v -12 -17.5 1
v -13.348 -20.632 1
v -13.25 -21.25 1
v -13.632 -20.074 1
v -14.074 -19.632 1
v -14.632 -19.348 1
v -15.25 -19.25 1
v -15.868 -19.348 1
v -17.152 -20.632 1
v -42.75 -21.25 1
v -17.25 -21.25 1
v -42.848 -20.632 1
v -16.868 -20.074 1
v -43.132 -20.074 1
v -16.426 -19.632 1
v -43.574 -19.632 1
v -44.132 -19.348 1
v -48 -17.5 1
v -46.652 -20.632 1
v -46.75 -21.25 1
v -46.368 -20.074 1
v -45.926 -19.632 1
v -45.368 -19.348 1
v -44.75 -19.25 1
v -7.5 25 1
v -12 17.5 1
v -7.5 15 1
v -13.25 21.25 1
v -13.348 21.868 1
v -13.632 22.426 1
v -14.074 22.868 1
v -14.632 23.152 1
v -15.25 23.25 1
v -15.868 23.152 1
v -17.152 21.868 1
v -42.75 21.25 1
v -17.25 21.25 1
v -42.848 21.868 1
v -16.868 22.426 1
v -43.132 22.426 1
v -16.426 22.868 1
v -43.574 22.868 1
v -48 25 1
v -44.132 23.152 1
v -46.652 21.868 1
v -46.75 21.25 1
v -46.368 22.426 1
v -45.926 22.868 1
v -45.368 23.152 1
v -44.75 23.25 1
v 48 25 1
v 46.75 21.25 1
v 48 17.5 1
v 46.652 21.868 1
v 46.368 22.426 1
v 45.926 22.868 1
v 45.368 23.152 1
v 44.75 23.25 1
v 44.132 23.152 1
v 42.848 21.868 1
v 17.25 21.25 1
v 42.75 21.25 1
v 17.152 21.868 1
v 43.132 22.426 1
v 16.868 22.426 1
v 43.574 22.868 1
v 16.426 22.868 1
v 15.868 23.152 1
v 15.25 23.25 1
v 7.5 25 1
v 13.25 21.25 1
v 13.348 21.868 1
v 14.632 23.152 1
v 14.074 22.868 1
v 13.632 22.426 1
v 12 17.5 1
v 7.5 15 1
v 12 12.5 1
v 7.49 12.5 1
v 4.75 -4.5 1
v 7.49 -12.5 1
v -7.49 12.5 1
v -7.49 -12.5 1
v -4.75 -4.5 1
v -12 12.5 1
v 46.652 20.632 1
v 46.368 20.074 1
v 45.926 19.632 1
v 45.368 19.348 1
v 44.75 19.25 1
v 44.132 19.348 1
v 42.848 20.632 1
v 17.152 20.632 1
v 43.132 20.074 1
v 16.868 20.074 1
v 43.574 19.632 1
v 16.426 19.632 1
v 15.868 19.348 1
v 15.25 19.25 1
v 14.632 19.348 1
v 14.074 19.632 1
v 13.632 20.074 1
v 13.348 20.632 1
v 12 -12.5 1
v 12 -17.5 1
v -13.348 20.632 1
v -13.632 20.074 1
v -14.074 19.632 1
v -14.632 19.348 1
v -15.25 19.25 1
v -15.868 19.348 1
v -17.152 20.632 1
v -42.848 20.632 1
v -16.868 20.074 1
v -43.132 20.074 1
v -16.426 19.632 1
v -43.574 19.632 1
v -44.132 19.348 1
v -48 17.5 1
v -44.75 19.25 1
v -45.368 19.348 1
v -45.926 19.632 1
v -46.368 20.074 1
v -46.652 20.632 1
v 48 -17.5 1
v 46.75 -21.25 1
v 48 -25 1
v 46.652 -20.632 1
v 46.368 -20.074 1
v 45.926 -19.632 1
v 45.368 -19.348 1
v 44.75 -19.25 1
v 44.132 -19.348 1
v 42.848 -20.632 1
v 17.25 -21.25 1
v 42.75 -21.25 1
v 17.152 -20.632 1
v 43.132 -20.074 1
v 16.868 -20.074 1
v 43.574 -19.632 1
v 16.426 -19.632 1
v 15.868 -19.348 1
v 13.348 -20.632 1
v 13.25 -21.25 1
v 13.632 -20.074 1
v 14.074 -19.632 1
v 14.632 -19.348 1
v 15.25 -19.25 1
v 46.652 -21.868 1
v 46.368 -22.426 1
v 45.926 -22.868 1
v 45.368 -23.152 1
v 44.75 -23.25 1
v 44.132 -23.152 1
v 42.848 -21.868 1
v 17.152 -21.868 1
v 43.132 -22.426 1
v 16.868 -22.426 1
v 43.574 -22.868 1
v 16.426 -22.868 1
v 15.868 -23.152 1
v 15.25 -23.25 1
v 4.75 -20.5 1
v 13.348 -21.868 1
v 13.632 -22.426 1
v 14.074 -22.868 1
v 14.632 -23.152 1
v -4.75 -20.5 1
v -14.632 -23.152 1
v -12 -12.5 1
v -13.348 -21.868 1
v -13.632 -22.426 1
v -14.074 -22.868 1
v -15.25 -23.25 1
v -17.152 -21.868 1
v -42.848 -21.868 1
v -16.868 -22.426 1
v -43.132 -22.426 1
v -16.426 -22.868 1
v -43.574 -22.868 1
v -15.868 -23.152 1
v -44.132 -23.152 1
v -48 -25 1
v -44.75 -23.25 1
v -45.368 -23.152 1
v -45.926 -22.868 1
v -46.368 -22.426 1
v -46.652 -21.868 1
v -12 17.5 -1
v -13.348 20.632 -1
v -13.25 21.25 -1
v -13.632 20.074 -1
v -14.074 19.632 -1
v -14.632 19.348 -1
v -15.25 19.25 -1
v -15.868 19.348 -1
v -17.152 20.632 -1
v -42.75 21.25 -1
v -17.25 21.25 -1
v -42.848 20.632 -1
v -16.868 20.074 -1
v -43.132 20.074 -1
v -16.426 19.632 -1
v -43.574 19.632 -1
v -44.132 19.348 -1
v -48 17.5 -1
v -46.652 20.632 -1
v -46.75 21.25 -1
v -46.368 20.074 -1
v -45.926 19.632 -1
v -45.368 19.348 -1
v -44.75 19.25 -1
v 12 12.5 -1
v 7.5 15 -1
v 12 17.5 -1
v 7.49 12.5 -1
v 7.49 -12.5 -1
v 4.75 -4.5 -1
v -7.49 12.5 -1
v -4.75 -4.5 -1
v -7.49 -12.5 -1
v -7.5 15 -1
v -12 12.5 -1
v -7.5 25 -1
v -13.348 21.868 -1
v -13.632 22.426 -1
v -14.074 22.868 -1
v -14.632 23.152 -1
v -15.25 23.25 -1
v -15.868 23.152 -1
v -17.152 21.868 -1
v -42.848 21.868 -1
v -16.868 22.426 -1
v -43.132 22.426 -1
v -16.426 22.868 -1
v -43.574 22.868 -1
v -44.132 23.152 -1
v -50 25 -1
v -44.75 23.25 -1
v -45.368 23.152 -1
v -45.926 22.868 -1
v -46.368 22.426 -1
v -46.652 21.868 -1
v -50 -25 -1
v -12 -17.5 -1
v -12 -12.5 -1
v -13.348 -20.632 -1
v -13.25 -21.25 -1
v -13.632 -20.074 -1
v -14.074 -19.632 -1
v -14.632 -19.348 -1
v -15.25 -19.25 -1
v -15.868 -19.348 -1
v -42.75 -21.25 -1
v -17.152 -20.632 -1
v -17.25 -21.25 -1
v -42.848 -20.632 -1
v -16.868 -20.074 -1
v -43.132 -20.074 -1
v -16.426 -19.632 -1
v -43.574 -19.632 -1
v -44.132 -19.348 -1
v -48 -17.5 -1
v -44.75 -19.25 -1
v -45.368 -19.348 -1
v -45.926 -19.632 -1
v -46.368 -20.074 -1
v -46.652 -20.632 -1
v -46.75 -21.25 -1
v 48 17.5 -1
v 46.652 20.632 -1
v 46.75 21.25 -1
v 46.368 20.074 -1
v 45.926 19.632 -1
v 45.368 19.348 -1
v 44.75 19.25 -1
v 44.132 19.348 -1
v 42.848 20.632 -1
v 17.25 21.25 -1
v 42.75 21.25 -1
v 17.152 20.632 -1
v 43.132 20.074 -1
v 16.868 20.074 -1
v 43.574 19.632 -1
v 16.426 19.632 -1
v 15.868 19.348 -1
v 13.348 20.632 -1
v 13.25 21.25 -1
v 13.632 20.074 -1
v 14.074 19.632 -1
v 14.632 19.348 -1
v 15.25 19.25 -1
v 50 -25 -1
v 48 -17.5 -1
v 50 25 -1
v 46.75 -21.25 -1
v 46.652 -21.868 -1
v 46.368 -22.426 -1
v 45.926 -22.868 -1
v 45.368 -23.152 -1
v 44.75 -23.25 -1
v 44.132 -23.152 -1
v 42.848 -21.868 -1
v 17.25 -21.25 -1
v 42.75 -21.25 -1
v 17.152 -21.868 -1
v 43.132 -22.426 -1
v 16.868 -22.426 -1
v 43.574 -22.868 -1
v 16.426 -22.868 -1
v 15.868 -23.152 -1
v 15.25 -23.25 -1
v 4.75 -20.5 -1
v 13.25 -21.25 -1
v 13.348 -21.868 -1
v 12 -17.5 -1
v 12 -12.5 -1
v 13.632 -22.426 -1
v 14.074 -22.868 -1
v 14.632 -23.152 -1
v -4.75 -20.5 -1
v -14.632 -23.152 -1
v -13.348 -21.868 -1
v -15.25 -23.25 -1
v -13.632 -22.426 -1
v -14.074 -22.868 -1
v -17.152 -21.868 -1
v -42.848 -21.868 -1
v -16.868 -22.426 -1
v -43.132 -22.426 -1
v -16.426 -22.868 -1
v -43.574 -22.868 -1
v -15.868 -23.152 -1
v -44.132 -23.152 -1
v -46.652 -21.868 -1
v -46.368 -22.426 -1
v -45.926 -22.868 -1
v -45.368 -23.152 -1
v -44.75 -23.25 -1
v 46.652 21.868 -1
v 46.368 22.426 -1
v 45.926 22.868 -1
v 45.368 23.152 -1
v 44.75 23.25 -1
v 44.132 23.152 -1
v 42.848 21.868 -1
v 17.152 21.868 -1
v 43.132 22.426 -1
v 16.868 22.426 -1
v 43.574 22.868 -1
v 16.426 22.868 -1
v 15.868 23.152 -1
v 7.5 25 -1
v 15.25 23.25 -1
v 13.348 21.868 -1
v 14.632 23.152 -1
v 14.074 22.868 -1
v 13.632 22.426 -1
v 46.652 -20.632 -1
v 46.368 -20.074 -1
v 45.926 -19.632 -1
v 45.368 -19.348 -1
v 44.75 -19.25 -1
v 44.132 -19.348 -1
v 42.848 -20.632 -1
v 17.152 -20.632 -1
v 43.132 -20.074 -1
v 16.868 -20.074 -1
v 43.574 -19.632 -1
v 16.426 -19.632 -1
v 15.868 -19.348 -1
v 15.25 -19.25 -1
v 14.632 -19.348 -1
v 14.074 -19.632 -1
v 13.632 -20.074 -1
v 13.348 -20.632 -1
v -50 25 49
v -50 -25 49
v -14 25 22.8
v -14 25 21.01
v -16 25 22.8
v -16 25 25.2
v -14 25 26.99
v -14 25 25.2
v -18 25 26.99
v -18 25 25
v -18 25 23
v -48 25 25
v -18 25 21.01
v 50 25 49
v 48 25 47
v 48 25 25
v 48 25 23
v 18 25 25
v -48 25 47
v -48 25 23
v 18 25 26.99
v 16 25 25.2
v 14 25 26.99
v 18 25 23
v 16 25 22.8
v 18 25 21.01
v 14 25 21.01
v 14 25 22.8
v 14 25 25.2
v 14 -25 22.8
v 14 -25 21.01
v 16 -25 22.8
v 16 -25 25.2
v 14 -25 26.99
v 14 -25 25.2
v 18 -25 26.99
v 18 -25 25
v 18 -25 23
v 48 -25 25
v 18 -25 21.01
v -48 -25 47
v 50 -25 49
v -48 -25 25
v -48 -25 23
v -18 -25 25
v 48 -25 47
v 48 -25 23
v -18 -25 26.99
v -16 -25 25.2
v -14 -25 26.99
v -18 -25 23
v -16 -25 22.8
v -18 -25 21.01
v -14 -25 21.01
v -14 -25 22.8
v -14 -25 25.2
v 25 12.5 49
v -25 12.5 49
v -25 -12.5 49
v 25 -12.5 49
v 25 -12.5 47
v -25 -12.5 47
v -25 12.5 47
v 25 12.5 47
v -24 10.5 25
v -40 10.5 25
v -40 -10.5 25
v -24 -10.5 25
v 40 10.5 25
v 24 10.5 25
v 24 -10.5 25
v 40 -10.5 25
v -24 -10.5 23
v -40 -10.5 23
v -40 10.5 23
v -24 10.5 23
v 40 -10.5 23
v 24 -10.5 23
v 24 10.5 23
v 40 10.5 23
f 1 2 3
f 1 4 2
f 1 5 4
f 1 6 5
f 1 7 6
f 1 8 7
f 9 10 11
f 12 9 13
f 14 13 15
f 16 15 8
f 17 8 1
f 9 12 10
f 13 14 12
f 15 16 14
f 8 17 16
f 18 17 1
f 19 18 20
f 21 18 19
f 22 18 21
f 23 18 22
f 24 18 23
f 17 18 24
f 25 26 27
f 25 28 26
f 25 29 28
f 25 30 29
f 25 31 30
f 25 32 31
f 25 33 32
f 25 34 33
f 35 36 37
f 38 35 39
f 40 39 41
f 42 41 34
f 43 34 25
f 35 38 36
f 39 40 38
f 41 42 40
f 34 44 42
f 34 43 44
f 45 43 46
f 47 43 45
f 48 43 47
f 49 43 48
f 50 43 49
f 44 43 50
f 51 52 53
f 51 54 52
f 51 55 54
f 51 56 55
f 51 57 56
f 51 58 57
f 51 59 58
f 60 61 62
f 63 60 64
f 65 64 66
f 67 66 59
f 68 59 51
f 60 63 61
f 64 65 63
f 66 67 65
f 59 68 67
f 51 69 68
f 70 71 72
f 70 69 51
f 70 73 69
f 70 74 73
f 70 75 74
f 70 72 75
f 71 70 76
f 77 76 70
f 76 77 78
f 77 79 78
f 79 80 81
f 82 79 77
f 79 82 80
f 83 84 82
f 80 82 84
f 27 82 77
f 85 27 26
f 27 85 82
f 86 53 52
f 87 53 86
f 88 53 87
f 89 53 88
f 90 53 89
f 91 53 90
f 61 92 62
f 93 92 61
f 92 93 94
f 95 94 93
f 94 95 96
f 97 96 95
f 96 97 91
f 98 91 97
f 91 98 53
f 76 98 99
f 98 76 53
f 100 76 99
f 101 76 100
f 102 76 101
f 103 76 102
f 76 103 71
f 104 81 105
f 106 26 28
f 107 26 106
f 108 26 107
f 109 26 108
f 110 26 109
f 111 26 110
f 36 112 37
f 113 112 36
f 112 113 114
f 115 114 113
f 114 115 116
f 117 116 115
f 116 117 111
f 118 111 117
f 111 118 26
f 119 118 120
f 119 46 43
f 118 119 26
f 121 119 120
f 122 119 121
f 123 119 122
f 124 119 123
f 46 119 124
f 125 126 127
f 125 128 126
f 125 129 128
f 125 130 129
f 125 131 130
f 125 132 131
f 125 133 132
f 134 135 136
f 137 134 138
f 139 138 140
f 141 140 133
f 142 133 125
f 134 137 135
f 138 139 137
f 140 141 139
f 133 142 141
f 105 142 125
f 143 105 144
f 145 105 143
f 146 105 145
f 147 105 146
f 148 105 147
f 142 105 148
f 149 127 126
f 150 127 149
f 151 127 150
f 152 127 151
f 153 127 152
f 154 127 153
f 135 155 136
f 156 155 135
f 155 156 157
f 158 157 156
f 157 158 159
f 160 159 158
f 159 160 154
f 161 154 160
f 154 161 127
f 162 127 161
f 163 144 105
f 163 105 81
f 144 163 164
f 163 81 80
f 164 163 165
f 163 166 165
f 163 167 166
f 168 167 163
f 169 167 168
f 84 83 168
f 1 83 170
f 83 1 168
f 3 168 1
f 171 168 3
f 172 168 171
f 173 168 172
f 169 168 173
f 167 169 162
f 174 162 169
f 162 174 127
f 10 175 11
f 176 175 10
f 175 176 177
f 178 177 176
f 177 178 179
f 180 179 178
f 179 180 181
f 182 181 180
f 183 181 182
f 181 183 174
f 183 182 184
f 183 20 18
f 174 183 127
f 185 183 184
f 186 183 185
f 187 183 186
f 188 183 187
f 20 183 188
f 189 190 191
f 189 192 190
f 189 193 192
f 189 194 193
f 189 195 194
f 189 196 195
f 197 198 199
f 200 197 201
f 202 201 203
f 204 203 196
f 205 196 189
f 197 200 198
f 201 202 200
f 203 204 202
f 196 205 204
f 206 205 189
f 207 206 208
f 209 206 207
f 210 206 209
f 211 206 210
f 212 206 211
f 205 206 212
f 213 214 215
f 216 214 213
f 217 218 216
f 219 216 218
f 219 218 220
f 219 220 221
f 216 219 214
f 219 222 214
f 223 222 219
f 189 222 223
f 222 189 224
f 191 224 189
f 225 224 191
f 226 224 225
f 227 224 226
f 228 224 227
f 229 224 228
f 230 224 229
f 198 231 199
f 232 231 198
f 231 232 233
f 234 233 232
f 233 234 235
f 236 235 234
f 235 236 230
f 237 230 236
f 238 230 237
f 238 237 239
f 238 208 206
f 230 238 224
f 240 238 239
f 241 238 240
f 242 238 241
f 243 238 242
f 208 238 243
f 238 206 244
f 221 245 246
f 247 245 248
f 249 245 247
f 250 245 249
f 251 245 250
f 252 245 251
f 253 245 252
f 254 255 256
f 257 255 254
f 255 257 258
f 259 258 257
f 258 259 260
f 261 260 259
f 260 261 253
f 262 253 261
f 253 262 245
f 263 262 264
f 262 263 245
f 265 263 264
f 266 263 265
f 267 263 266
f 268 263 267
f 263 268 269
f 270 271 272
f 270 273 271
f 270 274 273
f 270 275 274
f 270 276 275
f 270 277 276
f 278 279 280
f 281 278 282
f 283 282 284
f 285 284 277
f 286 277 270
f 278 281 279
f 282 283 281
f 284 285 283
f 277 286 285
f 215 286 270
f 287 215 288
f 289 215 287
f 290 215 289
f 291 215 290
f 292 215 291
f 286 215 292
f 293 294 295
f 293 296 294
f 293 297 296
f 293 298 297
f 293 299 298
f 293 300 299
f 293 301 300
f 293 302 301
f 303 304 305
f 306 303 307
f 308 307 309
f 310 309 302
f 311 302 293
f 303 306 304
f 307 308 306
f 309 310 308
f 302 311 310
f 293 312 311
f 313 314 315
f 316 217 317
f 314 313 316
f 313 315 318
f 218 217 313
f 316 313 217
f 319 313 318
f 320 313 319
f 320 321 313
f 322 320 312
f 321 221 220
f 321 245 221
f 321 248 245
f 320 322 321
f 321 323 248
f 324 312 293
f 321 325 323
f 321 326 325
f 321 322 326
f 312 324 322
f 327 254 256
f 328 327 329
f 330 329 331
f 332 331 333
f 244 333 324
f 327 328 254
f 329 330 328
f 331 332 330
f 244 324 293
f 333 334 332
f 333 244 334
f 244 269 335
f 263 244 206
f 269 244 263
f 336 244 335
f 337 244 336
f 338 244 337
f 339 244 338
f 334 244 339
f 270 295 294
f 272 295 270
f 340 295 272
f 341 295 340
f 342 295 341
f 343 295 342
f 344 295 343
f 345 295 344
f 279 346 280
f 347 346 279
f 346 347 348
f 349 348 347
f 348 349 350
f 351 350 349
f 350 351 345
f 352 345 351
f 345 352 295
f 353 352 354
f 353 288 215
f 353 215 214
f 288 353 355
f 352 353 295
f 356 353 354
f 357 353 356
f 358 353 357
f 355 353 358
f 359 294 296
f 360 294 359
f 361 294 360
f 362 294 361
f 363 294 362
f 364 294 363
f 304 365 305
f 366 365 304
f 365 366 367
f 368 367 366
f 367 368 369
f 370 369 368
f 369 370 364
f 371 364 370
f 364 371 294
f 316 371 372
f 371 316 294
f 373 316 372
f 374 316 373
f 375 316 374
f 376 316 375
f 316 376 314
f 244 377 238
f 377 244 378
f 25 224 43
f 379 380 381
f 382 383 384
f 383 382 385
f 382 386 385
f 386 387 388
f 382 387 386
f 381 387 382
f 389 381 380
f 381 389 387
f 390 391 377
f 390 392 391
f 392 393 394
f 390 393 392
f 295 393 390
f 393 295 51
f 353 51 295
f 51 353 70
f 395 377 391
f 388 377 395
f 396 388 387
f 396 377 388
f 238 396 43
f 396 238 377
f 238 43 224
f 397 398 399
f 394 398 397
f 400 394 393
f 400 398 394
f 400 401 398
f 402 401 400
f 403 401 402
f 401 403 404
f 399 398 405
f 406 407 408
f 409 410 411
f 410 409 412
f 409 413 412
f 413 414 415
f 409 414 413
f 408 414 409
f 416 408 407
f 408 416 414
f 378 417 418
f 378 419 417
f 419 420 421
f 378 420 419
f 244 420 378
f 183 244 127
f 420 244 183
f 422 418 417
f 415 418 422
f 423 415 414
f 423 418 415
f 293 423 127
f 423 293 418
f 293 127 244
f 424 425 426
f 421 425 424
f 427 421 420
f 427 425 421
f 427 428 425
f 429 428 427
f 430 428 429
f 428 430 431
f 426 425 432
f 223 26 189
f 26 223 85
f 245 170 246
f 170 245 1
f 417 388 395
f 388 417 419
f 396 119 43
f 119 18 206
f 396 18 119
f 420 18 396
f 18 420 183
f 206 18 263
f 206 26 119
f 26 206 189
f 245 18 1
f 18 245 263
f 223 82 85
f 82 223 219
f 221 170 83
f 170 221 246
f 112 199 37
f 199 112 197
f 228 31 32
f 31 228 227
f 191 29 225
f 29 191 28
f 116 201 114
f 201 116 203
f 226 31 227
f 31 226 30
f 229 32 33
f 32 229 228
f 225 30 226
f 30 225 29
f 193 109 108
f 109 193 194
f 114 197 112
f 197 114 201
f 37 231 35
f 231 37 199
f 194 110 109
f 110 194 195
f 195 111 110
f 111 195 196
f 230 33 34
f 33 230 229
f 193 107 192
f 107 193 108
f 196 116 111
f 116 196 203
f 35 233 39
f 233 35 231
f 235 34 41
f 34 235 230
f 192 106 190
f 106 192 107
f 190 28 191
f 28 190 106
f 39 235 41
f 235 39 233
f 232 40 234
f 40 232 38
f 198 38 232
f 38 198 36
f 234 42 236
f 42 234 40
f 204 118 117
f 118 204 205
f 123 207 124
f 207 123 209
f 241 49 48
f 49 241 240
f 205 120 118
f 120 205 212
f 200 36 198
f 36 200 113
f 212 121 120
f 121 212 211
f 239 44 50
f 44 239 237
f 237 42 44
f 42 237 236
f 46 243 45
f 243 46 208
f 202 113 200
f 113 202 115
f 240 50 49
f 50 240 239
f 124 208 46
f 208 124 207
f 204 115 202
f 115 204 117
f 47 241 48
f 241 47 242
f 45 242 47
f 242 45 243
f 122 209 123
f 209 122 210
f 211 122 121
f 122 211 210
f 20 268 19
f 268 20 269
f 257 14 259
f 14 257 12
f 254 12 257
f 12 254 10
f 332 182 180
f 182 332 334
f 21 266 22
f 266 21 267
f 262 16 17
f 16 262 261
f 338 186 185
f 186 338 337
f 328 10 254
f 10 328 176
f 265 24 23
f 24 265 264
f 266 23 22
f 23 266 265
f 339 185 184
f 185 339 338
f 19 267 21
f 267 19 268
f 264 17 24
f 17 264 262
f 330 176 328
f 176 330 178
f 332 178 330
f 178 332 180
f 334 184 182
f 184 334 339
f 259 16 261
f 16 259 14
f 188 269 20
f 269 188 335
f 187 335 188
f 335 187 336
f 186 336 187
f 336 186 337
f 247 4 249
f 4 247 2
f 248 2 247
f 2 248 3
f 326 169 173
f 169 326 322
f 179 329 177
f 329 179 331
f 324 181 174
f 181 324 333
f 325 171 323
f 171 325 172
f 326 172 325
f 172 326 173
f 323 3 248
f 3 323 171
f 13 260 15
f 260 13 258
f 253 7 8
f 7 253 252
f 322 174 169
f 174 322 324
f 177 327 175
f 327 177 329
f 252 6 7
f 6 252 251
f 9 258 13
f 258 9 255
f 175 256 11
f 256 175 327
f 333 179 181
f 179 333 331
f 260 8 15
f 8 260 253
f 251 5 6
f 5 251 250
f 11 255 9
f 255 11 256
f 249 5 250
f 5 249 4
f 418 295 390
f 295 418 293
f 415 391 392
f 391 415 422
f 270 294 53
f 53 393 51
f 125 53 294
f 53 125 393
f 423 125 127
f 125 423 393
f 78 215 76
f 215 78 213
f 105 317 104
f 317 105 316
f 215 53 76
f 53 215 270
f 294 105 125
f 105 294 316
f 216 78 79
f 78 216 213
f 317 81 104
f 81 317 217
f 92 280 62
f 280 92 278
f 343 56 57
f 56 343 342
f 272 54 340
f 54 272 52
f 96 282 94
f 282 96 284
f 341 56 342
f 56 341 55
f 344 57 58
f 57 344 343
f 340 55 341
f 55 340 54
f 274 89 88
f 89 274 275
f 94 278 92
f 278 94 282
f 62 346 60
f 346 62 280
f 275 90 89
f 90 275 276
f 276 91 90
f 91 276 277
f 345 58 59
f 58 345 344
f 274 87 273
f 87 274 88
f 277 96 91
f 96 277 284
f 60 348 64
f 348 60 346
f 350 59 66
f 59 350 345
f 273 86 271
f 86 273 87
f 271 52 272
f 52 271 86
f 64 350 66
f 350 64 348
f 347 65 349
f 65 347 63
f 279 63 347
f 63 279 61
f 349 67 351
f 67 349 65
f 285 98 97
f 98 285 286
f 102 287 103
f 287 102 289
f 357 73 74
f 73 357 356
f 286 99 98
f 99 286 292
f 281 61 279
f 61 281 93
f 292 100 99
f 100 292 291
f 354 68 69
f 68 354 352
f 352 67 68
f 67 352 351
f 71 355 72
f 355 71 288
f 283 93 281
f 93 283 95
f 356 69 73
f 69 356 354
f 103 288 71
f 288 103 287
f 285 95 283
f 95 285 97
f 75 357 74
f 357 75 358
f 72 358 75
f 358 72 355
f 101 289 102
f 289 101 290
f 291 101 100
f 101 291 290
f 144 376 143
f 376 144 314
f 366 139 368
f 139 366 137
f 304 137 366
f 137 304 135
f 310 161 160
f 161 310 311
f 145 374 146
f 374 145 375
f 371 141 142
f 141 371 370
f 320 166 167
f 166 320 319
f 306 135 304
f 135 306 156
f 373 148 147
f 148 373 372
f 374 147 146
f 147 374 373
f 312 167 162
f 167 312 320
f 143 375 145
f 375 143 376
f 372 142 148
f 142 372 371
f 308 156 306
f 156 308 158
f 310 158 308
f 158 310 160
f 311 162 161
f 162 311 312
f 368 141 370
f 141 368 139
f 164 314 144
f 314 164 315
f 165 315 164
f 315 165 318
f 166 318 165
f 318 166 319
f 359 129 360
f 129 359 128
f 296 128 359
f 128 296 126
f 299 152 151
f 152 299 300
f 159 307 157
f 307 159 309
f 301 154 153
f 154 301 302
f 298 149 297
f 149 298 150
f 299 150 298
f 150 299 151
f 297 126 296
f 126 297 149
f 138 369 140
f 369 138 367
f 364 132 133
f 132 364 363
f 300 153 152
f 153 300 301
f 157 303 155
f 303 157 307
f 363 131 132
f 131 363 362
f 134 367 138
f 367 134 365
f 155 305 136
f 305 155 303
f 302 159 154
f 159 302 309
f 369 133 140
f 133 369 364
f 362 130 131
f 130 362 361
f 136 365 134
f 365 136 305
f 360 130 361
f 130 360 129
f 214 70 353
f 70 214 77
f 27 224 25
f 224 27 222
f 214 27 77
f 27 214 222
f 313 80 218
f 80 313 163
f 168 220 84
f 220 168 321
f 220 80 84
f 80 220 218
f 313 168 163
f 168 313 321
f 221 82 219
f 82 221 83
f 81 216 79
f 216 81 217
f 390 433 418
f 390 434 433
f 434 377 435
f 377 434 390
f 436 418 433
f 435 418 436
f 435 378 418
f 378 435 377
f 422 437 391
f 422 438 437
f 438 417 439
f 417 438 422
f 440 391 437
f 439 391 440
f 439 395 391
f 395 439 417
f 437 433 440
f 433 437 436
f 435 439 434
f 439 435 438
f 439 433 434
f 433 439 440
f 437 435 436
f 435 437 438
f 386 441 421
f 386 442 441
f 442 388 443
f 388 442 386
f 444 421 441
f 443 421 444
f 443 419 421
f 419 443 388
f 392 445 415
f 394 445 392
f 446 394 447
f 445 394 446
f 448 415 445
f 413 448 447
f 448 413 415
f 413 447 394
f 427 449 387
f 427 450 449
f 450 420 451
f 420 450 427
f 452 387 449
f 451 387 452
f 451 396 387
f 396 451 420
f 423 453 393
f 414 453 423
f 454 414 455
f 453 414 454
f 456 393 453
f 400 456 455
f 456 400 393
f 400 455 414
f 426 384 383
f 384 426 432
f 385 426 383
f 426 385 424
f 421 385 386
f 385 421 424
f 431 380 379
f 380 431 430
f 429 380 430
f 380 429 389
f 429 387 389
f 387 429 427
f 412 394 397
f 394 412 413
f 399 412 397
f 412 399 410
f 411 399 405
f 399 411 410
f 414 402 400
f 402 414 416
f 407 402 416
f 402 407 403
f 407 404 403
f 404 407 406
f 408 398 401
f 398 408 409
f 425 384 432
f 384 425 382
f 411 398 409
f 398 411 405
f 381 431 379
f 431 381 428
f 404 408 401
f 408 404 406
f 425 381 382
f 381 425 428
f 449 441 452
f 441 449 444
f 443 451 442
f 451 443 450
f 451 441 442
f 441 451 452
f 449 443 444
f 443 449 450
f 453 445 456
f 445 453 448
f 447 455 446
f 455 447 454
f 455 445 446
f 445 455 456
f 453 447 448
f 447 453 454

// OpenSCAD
module driver(){
difference(){
    cube([40,50,2],center=true);

    cube([36,35,4],center=true);

    cube([40.1,25,4],center=true);

    translate([ 14.75, 21.25,0])cylinder(10,r=2,center=true,$fn=20);
    translate([-14.75, 21.25,0])cylinder(10,r=2,center=true,$fn=20);
    translate([-14.75,-21.25,0])cylinder(10,r=2,center=true,$fn=20);
    translate([ 14.75,-21.25,0])cylinder(10,r=2,center=true,$fn=20);
}
}


module board(){
translate([-30, 0,0])driver();
translate([ 30, 0,0])driver();
difference(){
    cube([20.01,50,2],center=true);

    //cylinder(10, r=2.5,center=true,$fn=50);

    translate([0,20,0])cube([15,10,10],center=true);

    //translate([0, 12.5,0])cube([9.5,16,4],center=true);
    translate([0,-12.5,0])cube([9.5,16,4],center=true);

    translate([1.25-10, 0, 0])cube([2.52,25,4],center=true);
    translate([10-1.25, 0, 0])cube([2.52,25,4],center=true);
}
}


module motor(){
//difference(){
//    translate([0,0,4])cylinder(10, r=20,center=true,$fn=50);
//    translate([0,0,4])cylinder(10.1, r=18,center=true,$fn=50);
//}
difference(){
    union(){
        translate([12.5,0,0])cube([25,50,2],center=true);
        cylinder(2, r=25,center=true,$fn=50);
    }

    cylinder(10, r=12,center=true,$fn=50);

    translate([ 15.5, 15.5,0])cylinder(10, r=2,center=true,$fn=20);
    translate([-15.5, 15.5,0])cylinder(10, r=2,center=true,$fn=20);
    translate([-15.5,-15.5,0])cylinder(10, r=2,center=true,$fn=20);
    translate([ 15.5,-15.5,0])cylinder(10, r=2,center=true,$fn=20);

    for(j=[0:11])rotate([0,0,j*360/12])
        translate([0,12.5,0])cylinder(10, r=2,center=true,$fn=10);
}
}


module bot(){
board();

translate([-49,0,-24])rotate([0,-90,180])motor();
translate([ 49,0,-24])rotate([0,-90,0])motor();

translate([0,-24,-17.75])cube([100,2,12.5],center=true);
translate([0, 24,-17.75])cube([100,2,12.5],center=true);
}


module mid(){
board();

translate([-49, 0,24])cube([2,50,50],center=true);
translate([ 49, 0,24])cube([2,50,50],center=true);

difference(){
translate([ 0, 0,48])cube([100,50,2],center=true);
translate([ 0, 0,48])cube([50,25,10],center=true);
}

difference(){
union(){
translate([ 0, 0,24])cube([100,50,2],center=true);
    translate([-16, 0,25.99])cube([4,50,2],center=true);
    translate([-16, 0,22.01])cube([4,50,2],center=true);
    translate([ 16, 0,25.99])cube([4,50,2],center=true);
    translate([ 16, 0,22.01])cube([4,50,2],center=true);
}
translate([ 0, 0,24])cube([32,100,2.4],center=true);

translate([-32, 0, 24])cube([16,21,25],center=true);
translate([ 32, 0, 24])cube([16,21,25],center=true);
}

}


//bot();
mid();
